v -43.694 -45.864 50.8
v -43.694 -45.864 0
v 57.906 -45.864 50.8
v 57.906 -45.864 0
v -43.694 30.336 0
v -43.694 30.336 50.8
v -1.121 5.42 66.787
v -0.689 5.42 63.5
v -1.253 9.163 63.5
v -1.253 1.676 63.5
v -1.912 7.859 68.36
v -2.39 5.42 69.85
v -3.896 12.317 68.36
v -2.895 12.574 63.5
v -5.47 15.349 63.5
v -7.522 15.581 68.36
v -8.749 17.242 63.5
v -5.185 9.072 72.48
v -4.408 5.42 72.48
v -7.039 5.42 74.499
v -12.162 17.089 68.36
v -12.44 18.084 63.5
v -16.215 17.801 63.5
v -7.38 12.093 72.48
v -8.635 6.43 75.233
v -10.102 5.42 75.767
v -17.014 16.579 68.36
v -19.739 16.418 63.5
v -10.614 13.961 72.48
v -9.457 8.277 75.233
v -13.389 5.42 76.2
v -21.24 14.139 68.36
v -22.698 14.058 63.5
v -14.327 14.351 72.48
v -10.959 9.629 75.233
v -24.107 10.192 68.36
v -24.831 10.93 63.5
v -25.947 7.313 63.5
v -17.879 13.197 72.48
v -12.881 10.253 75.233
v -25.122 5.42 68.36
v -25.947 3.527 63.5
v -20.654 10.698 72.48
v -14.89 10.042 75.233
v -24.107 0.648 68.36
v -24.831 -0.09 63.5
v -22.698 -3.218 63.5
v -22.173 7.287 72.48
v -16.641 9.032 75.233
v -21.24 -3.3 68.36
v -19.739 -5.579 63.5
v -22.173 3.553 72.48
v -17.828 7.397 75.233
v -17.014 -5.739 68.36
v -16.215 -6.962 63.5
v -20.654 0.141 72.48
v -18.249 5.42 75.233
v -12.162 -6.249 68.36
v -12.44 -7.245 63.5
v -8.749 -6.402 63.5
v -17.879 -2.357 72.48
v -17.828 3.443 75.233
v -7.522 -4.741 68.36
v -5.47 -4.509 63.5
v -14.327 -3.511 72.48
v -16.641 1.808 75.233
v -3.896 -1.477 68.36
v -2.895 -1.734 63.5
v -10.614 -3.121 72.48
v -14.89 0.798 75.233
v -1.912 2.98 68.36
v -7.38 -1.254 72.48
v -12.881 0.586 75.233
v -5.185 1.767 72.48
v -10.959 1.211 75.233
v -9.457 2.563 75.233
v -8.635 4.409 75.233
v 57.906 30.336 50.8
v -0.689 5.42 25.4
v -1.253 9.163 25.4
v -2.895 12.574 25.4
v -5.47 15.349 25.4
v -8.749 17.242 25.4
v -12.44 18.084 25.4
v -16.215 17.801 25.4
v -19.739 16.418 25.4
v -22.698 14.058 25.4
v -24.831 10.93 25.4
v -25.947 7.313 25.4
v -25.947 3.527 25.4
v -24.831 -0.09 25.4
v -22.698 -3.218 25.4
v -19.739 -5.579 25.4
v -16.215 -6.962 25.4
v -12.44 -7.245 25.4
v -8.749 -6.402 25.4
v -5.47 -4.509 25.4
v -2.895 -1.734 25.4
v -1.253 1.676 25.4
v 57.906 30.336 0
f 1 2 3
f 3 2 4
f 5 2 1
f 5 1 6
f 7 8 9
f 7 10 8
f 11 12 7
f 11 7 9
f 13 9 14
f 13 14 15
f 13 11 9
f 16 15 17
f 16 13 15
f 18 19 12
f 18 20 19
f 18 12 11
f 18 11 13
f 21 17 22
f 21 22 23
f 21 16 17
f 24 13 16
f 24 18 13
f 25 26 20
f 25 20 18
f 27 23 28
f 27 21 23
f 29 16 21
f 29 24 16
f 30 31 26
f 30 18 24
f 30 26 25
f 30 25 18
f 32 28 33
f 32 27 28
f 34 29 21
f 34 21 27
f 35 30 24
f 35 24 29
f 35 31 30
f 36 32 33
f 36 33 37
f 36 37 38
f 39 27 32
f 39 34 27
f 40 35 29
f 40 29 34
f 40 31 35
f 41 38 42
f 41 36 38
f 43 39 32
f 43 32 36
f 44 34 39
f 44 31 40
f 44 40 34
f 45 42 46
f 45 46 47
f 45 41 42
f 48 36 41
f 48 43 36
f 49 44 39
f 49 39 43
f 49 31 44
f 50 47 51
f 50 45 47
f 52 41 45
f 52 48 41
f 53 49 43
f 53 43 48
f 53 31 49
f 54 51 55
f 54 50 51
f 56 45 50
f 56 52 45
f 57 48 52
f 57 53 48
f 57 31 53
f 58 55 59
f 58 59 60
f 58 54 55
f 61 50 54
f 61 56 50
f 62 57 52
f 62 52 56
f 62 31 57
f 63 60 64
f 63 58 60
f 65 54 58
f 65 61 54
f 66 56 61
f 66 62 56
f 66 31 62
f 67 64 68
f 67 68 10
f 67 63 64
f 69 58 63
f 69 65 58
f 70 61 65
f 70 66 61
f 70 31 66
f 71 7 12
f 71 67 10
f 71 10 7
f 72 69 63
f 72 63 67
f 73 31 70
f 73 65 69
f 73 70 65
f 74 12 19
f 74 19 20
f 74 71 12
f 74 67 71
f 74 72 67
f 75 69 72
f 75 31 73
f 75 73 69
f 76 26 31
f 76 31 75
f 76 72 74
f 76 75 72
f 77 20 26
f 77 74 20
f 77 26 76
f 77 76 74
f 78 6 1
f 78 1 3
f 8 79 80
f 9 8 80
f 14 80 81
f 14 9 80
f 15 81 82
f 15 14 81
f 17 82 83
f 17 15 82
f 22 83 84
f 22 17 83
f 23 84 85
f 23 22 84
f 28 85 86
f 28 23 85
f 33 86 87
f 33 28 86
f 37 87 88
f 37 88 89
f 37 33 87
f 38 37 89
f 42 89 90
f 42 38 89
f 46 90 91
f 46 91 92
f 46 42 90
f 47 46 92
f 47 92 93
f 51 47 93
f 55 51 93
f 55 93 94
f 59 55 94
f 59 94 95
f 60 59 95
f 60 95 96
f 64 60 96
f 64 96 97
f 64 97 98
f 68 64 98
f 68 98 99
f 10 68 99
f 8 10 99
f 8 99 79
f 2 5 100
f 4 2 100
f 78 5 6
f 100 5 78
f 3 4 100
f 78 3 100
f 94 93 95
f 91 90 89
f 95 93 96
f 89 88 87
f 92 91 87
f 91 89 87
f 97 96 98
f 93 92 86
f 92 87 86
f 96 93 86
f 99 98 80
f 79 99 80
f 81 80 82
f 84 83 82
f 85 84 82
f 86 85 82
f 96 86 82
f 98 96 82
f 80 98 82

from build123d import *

# Parameters (mm, degrees)
F0_W          = 101.6
F0_H          = 76.2
F1_DEPTH      = 50.8
F2_R          = 12.7
F3_DEPTH      = 25.4
F3_DEPTH_BACK = 25.4
F4_R          = 12.7


with BuildPart() as f1:
    # F0 (on Top) → F1 (new body)
    with BuildSketch(Plane.XY):
        with Locations((7.105511, -7.764197)):
            Rectangle(F0_W, F0_H)
    extrude(amount=F1_DEPTH)


with BuildPart() as f3:
    # F2 (on face) → F3 (new body, two sides)
    with BuildSketch(Plane.XY.offset(50.8)) as f3_sk:
        with Locations((-13.388594, 5.419864)):
            Circle(F2_R)
    extrude(amount=F3_DEPTH)
    extrude(f3_sk.sketch, amount=-F3_DEPTH_BACK)

    # F4
    f4_edges = [f3.edges().sort_by_distance(p)[0] for p in [
        (-26.088594, 5.419864, 76.2),
    ]]
    fillet(f4_edges, radius=F4_R)


solid = Compound([f1.part, f3.part])
